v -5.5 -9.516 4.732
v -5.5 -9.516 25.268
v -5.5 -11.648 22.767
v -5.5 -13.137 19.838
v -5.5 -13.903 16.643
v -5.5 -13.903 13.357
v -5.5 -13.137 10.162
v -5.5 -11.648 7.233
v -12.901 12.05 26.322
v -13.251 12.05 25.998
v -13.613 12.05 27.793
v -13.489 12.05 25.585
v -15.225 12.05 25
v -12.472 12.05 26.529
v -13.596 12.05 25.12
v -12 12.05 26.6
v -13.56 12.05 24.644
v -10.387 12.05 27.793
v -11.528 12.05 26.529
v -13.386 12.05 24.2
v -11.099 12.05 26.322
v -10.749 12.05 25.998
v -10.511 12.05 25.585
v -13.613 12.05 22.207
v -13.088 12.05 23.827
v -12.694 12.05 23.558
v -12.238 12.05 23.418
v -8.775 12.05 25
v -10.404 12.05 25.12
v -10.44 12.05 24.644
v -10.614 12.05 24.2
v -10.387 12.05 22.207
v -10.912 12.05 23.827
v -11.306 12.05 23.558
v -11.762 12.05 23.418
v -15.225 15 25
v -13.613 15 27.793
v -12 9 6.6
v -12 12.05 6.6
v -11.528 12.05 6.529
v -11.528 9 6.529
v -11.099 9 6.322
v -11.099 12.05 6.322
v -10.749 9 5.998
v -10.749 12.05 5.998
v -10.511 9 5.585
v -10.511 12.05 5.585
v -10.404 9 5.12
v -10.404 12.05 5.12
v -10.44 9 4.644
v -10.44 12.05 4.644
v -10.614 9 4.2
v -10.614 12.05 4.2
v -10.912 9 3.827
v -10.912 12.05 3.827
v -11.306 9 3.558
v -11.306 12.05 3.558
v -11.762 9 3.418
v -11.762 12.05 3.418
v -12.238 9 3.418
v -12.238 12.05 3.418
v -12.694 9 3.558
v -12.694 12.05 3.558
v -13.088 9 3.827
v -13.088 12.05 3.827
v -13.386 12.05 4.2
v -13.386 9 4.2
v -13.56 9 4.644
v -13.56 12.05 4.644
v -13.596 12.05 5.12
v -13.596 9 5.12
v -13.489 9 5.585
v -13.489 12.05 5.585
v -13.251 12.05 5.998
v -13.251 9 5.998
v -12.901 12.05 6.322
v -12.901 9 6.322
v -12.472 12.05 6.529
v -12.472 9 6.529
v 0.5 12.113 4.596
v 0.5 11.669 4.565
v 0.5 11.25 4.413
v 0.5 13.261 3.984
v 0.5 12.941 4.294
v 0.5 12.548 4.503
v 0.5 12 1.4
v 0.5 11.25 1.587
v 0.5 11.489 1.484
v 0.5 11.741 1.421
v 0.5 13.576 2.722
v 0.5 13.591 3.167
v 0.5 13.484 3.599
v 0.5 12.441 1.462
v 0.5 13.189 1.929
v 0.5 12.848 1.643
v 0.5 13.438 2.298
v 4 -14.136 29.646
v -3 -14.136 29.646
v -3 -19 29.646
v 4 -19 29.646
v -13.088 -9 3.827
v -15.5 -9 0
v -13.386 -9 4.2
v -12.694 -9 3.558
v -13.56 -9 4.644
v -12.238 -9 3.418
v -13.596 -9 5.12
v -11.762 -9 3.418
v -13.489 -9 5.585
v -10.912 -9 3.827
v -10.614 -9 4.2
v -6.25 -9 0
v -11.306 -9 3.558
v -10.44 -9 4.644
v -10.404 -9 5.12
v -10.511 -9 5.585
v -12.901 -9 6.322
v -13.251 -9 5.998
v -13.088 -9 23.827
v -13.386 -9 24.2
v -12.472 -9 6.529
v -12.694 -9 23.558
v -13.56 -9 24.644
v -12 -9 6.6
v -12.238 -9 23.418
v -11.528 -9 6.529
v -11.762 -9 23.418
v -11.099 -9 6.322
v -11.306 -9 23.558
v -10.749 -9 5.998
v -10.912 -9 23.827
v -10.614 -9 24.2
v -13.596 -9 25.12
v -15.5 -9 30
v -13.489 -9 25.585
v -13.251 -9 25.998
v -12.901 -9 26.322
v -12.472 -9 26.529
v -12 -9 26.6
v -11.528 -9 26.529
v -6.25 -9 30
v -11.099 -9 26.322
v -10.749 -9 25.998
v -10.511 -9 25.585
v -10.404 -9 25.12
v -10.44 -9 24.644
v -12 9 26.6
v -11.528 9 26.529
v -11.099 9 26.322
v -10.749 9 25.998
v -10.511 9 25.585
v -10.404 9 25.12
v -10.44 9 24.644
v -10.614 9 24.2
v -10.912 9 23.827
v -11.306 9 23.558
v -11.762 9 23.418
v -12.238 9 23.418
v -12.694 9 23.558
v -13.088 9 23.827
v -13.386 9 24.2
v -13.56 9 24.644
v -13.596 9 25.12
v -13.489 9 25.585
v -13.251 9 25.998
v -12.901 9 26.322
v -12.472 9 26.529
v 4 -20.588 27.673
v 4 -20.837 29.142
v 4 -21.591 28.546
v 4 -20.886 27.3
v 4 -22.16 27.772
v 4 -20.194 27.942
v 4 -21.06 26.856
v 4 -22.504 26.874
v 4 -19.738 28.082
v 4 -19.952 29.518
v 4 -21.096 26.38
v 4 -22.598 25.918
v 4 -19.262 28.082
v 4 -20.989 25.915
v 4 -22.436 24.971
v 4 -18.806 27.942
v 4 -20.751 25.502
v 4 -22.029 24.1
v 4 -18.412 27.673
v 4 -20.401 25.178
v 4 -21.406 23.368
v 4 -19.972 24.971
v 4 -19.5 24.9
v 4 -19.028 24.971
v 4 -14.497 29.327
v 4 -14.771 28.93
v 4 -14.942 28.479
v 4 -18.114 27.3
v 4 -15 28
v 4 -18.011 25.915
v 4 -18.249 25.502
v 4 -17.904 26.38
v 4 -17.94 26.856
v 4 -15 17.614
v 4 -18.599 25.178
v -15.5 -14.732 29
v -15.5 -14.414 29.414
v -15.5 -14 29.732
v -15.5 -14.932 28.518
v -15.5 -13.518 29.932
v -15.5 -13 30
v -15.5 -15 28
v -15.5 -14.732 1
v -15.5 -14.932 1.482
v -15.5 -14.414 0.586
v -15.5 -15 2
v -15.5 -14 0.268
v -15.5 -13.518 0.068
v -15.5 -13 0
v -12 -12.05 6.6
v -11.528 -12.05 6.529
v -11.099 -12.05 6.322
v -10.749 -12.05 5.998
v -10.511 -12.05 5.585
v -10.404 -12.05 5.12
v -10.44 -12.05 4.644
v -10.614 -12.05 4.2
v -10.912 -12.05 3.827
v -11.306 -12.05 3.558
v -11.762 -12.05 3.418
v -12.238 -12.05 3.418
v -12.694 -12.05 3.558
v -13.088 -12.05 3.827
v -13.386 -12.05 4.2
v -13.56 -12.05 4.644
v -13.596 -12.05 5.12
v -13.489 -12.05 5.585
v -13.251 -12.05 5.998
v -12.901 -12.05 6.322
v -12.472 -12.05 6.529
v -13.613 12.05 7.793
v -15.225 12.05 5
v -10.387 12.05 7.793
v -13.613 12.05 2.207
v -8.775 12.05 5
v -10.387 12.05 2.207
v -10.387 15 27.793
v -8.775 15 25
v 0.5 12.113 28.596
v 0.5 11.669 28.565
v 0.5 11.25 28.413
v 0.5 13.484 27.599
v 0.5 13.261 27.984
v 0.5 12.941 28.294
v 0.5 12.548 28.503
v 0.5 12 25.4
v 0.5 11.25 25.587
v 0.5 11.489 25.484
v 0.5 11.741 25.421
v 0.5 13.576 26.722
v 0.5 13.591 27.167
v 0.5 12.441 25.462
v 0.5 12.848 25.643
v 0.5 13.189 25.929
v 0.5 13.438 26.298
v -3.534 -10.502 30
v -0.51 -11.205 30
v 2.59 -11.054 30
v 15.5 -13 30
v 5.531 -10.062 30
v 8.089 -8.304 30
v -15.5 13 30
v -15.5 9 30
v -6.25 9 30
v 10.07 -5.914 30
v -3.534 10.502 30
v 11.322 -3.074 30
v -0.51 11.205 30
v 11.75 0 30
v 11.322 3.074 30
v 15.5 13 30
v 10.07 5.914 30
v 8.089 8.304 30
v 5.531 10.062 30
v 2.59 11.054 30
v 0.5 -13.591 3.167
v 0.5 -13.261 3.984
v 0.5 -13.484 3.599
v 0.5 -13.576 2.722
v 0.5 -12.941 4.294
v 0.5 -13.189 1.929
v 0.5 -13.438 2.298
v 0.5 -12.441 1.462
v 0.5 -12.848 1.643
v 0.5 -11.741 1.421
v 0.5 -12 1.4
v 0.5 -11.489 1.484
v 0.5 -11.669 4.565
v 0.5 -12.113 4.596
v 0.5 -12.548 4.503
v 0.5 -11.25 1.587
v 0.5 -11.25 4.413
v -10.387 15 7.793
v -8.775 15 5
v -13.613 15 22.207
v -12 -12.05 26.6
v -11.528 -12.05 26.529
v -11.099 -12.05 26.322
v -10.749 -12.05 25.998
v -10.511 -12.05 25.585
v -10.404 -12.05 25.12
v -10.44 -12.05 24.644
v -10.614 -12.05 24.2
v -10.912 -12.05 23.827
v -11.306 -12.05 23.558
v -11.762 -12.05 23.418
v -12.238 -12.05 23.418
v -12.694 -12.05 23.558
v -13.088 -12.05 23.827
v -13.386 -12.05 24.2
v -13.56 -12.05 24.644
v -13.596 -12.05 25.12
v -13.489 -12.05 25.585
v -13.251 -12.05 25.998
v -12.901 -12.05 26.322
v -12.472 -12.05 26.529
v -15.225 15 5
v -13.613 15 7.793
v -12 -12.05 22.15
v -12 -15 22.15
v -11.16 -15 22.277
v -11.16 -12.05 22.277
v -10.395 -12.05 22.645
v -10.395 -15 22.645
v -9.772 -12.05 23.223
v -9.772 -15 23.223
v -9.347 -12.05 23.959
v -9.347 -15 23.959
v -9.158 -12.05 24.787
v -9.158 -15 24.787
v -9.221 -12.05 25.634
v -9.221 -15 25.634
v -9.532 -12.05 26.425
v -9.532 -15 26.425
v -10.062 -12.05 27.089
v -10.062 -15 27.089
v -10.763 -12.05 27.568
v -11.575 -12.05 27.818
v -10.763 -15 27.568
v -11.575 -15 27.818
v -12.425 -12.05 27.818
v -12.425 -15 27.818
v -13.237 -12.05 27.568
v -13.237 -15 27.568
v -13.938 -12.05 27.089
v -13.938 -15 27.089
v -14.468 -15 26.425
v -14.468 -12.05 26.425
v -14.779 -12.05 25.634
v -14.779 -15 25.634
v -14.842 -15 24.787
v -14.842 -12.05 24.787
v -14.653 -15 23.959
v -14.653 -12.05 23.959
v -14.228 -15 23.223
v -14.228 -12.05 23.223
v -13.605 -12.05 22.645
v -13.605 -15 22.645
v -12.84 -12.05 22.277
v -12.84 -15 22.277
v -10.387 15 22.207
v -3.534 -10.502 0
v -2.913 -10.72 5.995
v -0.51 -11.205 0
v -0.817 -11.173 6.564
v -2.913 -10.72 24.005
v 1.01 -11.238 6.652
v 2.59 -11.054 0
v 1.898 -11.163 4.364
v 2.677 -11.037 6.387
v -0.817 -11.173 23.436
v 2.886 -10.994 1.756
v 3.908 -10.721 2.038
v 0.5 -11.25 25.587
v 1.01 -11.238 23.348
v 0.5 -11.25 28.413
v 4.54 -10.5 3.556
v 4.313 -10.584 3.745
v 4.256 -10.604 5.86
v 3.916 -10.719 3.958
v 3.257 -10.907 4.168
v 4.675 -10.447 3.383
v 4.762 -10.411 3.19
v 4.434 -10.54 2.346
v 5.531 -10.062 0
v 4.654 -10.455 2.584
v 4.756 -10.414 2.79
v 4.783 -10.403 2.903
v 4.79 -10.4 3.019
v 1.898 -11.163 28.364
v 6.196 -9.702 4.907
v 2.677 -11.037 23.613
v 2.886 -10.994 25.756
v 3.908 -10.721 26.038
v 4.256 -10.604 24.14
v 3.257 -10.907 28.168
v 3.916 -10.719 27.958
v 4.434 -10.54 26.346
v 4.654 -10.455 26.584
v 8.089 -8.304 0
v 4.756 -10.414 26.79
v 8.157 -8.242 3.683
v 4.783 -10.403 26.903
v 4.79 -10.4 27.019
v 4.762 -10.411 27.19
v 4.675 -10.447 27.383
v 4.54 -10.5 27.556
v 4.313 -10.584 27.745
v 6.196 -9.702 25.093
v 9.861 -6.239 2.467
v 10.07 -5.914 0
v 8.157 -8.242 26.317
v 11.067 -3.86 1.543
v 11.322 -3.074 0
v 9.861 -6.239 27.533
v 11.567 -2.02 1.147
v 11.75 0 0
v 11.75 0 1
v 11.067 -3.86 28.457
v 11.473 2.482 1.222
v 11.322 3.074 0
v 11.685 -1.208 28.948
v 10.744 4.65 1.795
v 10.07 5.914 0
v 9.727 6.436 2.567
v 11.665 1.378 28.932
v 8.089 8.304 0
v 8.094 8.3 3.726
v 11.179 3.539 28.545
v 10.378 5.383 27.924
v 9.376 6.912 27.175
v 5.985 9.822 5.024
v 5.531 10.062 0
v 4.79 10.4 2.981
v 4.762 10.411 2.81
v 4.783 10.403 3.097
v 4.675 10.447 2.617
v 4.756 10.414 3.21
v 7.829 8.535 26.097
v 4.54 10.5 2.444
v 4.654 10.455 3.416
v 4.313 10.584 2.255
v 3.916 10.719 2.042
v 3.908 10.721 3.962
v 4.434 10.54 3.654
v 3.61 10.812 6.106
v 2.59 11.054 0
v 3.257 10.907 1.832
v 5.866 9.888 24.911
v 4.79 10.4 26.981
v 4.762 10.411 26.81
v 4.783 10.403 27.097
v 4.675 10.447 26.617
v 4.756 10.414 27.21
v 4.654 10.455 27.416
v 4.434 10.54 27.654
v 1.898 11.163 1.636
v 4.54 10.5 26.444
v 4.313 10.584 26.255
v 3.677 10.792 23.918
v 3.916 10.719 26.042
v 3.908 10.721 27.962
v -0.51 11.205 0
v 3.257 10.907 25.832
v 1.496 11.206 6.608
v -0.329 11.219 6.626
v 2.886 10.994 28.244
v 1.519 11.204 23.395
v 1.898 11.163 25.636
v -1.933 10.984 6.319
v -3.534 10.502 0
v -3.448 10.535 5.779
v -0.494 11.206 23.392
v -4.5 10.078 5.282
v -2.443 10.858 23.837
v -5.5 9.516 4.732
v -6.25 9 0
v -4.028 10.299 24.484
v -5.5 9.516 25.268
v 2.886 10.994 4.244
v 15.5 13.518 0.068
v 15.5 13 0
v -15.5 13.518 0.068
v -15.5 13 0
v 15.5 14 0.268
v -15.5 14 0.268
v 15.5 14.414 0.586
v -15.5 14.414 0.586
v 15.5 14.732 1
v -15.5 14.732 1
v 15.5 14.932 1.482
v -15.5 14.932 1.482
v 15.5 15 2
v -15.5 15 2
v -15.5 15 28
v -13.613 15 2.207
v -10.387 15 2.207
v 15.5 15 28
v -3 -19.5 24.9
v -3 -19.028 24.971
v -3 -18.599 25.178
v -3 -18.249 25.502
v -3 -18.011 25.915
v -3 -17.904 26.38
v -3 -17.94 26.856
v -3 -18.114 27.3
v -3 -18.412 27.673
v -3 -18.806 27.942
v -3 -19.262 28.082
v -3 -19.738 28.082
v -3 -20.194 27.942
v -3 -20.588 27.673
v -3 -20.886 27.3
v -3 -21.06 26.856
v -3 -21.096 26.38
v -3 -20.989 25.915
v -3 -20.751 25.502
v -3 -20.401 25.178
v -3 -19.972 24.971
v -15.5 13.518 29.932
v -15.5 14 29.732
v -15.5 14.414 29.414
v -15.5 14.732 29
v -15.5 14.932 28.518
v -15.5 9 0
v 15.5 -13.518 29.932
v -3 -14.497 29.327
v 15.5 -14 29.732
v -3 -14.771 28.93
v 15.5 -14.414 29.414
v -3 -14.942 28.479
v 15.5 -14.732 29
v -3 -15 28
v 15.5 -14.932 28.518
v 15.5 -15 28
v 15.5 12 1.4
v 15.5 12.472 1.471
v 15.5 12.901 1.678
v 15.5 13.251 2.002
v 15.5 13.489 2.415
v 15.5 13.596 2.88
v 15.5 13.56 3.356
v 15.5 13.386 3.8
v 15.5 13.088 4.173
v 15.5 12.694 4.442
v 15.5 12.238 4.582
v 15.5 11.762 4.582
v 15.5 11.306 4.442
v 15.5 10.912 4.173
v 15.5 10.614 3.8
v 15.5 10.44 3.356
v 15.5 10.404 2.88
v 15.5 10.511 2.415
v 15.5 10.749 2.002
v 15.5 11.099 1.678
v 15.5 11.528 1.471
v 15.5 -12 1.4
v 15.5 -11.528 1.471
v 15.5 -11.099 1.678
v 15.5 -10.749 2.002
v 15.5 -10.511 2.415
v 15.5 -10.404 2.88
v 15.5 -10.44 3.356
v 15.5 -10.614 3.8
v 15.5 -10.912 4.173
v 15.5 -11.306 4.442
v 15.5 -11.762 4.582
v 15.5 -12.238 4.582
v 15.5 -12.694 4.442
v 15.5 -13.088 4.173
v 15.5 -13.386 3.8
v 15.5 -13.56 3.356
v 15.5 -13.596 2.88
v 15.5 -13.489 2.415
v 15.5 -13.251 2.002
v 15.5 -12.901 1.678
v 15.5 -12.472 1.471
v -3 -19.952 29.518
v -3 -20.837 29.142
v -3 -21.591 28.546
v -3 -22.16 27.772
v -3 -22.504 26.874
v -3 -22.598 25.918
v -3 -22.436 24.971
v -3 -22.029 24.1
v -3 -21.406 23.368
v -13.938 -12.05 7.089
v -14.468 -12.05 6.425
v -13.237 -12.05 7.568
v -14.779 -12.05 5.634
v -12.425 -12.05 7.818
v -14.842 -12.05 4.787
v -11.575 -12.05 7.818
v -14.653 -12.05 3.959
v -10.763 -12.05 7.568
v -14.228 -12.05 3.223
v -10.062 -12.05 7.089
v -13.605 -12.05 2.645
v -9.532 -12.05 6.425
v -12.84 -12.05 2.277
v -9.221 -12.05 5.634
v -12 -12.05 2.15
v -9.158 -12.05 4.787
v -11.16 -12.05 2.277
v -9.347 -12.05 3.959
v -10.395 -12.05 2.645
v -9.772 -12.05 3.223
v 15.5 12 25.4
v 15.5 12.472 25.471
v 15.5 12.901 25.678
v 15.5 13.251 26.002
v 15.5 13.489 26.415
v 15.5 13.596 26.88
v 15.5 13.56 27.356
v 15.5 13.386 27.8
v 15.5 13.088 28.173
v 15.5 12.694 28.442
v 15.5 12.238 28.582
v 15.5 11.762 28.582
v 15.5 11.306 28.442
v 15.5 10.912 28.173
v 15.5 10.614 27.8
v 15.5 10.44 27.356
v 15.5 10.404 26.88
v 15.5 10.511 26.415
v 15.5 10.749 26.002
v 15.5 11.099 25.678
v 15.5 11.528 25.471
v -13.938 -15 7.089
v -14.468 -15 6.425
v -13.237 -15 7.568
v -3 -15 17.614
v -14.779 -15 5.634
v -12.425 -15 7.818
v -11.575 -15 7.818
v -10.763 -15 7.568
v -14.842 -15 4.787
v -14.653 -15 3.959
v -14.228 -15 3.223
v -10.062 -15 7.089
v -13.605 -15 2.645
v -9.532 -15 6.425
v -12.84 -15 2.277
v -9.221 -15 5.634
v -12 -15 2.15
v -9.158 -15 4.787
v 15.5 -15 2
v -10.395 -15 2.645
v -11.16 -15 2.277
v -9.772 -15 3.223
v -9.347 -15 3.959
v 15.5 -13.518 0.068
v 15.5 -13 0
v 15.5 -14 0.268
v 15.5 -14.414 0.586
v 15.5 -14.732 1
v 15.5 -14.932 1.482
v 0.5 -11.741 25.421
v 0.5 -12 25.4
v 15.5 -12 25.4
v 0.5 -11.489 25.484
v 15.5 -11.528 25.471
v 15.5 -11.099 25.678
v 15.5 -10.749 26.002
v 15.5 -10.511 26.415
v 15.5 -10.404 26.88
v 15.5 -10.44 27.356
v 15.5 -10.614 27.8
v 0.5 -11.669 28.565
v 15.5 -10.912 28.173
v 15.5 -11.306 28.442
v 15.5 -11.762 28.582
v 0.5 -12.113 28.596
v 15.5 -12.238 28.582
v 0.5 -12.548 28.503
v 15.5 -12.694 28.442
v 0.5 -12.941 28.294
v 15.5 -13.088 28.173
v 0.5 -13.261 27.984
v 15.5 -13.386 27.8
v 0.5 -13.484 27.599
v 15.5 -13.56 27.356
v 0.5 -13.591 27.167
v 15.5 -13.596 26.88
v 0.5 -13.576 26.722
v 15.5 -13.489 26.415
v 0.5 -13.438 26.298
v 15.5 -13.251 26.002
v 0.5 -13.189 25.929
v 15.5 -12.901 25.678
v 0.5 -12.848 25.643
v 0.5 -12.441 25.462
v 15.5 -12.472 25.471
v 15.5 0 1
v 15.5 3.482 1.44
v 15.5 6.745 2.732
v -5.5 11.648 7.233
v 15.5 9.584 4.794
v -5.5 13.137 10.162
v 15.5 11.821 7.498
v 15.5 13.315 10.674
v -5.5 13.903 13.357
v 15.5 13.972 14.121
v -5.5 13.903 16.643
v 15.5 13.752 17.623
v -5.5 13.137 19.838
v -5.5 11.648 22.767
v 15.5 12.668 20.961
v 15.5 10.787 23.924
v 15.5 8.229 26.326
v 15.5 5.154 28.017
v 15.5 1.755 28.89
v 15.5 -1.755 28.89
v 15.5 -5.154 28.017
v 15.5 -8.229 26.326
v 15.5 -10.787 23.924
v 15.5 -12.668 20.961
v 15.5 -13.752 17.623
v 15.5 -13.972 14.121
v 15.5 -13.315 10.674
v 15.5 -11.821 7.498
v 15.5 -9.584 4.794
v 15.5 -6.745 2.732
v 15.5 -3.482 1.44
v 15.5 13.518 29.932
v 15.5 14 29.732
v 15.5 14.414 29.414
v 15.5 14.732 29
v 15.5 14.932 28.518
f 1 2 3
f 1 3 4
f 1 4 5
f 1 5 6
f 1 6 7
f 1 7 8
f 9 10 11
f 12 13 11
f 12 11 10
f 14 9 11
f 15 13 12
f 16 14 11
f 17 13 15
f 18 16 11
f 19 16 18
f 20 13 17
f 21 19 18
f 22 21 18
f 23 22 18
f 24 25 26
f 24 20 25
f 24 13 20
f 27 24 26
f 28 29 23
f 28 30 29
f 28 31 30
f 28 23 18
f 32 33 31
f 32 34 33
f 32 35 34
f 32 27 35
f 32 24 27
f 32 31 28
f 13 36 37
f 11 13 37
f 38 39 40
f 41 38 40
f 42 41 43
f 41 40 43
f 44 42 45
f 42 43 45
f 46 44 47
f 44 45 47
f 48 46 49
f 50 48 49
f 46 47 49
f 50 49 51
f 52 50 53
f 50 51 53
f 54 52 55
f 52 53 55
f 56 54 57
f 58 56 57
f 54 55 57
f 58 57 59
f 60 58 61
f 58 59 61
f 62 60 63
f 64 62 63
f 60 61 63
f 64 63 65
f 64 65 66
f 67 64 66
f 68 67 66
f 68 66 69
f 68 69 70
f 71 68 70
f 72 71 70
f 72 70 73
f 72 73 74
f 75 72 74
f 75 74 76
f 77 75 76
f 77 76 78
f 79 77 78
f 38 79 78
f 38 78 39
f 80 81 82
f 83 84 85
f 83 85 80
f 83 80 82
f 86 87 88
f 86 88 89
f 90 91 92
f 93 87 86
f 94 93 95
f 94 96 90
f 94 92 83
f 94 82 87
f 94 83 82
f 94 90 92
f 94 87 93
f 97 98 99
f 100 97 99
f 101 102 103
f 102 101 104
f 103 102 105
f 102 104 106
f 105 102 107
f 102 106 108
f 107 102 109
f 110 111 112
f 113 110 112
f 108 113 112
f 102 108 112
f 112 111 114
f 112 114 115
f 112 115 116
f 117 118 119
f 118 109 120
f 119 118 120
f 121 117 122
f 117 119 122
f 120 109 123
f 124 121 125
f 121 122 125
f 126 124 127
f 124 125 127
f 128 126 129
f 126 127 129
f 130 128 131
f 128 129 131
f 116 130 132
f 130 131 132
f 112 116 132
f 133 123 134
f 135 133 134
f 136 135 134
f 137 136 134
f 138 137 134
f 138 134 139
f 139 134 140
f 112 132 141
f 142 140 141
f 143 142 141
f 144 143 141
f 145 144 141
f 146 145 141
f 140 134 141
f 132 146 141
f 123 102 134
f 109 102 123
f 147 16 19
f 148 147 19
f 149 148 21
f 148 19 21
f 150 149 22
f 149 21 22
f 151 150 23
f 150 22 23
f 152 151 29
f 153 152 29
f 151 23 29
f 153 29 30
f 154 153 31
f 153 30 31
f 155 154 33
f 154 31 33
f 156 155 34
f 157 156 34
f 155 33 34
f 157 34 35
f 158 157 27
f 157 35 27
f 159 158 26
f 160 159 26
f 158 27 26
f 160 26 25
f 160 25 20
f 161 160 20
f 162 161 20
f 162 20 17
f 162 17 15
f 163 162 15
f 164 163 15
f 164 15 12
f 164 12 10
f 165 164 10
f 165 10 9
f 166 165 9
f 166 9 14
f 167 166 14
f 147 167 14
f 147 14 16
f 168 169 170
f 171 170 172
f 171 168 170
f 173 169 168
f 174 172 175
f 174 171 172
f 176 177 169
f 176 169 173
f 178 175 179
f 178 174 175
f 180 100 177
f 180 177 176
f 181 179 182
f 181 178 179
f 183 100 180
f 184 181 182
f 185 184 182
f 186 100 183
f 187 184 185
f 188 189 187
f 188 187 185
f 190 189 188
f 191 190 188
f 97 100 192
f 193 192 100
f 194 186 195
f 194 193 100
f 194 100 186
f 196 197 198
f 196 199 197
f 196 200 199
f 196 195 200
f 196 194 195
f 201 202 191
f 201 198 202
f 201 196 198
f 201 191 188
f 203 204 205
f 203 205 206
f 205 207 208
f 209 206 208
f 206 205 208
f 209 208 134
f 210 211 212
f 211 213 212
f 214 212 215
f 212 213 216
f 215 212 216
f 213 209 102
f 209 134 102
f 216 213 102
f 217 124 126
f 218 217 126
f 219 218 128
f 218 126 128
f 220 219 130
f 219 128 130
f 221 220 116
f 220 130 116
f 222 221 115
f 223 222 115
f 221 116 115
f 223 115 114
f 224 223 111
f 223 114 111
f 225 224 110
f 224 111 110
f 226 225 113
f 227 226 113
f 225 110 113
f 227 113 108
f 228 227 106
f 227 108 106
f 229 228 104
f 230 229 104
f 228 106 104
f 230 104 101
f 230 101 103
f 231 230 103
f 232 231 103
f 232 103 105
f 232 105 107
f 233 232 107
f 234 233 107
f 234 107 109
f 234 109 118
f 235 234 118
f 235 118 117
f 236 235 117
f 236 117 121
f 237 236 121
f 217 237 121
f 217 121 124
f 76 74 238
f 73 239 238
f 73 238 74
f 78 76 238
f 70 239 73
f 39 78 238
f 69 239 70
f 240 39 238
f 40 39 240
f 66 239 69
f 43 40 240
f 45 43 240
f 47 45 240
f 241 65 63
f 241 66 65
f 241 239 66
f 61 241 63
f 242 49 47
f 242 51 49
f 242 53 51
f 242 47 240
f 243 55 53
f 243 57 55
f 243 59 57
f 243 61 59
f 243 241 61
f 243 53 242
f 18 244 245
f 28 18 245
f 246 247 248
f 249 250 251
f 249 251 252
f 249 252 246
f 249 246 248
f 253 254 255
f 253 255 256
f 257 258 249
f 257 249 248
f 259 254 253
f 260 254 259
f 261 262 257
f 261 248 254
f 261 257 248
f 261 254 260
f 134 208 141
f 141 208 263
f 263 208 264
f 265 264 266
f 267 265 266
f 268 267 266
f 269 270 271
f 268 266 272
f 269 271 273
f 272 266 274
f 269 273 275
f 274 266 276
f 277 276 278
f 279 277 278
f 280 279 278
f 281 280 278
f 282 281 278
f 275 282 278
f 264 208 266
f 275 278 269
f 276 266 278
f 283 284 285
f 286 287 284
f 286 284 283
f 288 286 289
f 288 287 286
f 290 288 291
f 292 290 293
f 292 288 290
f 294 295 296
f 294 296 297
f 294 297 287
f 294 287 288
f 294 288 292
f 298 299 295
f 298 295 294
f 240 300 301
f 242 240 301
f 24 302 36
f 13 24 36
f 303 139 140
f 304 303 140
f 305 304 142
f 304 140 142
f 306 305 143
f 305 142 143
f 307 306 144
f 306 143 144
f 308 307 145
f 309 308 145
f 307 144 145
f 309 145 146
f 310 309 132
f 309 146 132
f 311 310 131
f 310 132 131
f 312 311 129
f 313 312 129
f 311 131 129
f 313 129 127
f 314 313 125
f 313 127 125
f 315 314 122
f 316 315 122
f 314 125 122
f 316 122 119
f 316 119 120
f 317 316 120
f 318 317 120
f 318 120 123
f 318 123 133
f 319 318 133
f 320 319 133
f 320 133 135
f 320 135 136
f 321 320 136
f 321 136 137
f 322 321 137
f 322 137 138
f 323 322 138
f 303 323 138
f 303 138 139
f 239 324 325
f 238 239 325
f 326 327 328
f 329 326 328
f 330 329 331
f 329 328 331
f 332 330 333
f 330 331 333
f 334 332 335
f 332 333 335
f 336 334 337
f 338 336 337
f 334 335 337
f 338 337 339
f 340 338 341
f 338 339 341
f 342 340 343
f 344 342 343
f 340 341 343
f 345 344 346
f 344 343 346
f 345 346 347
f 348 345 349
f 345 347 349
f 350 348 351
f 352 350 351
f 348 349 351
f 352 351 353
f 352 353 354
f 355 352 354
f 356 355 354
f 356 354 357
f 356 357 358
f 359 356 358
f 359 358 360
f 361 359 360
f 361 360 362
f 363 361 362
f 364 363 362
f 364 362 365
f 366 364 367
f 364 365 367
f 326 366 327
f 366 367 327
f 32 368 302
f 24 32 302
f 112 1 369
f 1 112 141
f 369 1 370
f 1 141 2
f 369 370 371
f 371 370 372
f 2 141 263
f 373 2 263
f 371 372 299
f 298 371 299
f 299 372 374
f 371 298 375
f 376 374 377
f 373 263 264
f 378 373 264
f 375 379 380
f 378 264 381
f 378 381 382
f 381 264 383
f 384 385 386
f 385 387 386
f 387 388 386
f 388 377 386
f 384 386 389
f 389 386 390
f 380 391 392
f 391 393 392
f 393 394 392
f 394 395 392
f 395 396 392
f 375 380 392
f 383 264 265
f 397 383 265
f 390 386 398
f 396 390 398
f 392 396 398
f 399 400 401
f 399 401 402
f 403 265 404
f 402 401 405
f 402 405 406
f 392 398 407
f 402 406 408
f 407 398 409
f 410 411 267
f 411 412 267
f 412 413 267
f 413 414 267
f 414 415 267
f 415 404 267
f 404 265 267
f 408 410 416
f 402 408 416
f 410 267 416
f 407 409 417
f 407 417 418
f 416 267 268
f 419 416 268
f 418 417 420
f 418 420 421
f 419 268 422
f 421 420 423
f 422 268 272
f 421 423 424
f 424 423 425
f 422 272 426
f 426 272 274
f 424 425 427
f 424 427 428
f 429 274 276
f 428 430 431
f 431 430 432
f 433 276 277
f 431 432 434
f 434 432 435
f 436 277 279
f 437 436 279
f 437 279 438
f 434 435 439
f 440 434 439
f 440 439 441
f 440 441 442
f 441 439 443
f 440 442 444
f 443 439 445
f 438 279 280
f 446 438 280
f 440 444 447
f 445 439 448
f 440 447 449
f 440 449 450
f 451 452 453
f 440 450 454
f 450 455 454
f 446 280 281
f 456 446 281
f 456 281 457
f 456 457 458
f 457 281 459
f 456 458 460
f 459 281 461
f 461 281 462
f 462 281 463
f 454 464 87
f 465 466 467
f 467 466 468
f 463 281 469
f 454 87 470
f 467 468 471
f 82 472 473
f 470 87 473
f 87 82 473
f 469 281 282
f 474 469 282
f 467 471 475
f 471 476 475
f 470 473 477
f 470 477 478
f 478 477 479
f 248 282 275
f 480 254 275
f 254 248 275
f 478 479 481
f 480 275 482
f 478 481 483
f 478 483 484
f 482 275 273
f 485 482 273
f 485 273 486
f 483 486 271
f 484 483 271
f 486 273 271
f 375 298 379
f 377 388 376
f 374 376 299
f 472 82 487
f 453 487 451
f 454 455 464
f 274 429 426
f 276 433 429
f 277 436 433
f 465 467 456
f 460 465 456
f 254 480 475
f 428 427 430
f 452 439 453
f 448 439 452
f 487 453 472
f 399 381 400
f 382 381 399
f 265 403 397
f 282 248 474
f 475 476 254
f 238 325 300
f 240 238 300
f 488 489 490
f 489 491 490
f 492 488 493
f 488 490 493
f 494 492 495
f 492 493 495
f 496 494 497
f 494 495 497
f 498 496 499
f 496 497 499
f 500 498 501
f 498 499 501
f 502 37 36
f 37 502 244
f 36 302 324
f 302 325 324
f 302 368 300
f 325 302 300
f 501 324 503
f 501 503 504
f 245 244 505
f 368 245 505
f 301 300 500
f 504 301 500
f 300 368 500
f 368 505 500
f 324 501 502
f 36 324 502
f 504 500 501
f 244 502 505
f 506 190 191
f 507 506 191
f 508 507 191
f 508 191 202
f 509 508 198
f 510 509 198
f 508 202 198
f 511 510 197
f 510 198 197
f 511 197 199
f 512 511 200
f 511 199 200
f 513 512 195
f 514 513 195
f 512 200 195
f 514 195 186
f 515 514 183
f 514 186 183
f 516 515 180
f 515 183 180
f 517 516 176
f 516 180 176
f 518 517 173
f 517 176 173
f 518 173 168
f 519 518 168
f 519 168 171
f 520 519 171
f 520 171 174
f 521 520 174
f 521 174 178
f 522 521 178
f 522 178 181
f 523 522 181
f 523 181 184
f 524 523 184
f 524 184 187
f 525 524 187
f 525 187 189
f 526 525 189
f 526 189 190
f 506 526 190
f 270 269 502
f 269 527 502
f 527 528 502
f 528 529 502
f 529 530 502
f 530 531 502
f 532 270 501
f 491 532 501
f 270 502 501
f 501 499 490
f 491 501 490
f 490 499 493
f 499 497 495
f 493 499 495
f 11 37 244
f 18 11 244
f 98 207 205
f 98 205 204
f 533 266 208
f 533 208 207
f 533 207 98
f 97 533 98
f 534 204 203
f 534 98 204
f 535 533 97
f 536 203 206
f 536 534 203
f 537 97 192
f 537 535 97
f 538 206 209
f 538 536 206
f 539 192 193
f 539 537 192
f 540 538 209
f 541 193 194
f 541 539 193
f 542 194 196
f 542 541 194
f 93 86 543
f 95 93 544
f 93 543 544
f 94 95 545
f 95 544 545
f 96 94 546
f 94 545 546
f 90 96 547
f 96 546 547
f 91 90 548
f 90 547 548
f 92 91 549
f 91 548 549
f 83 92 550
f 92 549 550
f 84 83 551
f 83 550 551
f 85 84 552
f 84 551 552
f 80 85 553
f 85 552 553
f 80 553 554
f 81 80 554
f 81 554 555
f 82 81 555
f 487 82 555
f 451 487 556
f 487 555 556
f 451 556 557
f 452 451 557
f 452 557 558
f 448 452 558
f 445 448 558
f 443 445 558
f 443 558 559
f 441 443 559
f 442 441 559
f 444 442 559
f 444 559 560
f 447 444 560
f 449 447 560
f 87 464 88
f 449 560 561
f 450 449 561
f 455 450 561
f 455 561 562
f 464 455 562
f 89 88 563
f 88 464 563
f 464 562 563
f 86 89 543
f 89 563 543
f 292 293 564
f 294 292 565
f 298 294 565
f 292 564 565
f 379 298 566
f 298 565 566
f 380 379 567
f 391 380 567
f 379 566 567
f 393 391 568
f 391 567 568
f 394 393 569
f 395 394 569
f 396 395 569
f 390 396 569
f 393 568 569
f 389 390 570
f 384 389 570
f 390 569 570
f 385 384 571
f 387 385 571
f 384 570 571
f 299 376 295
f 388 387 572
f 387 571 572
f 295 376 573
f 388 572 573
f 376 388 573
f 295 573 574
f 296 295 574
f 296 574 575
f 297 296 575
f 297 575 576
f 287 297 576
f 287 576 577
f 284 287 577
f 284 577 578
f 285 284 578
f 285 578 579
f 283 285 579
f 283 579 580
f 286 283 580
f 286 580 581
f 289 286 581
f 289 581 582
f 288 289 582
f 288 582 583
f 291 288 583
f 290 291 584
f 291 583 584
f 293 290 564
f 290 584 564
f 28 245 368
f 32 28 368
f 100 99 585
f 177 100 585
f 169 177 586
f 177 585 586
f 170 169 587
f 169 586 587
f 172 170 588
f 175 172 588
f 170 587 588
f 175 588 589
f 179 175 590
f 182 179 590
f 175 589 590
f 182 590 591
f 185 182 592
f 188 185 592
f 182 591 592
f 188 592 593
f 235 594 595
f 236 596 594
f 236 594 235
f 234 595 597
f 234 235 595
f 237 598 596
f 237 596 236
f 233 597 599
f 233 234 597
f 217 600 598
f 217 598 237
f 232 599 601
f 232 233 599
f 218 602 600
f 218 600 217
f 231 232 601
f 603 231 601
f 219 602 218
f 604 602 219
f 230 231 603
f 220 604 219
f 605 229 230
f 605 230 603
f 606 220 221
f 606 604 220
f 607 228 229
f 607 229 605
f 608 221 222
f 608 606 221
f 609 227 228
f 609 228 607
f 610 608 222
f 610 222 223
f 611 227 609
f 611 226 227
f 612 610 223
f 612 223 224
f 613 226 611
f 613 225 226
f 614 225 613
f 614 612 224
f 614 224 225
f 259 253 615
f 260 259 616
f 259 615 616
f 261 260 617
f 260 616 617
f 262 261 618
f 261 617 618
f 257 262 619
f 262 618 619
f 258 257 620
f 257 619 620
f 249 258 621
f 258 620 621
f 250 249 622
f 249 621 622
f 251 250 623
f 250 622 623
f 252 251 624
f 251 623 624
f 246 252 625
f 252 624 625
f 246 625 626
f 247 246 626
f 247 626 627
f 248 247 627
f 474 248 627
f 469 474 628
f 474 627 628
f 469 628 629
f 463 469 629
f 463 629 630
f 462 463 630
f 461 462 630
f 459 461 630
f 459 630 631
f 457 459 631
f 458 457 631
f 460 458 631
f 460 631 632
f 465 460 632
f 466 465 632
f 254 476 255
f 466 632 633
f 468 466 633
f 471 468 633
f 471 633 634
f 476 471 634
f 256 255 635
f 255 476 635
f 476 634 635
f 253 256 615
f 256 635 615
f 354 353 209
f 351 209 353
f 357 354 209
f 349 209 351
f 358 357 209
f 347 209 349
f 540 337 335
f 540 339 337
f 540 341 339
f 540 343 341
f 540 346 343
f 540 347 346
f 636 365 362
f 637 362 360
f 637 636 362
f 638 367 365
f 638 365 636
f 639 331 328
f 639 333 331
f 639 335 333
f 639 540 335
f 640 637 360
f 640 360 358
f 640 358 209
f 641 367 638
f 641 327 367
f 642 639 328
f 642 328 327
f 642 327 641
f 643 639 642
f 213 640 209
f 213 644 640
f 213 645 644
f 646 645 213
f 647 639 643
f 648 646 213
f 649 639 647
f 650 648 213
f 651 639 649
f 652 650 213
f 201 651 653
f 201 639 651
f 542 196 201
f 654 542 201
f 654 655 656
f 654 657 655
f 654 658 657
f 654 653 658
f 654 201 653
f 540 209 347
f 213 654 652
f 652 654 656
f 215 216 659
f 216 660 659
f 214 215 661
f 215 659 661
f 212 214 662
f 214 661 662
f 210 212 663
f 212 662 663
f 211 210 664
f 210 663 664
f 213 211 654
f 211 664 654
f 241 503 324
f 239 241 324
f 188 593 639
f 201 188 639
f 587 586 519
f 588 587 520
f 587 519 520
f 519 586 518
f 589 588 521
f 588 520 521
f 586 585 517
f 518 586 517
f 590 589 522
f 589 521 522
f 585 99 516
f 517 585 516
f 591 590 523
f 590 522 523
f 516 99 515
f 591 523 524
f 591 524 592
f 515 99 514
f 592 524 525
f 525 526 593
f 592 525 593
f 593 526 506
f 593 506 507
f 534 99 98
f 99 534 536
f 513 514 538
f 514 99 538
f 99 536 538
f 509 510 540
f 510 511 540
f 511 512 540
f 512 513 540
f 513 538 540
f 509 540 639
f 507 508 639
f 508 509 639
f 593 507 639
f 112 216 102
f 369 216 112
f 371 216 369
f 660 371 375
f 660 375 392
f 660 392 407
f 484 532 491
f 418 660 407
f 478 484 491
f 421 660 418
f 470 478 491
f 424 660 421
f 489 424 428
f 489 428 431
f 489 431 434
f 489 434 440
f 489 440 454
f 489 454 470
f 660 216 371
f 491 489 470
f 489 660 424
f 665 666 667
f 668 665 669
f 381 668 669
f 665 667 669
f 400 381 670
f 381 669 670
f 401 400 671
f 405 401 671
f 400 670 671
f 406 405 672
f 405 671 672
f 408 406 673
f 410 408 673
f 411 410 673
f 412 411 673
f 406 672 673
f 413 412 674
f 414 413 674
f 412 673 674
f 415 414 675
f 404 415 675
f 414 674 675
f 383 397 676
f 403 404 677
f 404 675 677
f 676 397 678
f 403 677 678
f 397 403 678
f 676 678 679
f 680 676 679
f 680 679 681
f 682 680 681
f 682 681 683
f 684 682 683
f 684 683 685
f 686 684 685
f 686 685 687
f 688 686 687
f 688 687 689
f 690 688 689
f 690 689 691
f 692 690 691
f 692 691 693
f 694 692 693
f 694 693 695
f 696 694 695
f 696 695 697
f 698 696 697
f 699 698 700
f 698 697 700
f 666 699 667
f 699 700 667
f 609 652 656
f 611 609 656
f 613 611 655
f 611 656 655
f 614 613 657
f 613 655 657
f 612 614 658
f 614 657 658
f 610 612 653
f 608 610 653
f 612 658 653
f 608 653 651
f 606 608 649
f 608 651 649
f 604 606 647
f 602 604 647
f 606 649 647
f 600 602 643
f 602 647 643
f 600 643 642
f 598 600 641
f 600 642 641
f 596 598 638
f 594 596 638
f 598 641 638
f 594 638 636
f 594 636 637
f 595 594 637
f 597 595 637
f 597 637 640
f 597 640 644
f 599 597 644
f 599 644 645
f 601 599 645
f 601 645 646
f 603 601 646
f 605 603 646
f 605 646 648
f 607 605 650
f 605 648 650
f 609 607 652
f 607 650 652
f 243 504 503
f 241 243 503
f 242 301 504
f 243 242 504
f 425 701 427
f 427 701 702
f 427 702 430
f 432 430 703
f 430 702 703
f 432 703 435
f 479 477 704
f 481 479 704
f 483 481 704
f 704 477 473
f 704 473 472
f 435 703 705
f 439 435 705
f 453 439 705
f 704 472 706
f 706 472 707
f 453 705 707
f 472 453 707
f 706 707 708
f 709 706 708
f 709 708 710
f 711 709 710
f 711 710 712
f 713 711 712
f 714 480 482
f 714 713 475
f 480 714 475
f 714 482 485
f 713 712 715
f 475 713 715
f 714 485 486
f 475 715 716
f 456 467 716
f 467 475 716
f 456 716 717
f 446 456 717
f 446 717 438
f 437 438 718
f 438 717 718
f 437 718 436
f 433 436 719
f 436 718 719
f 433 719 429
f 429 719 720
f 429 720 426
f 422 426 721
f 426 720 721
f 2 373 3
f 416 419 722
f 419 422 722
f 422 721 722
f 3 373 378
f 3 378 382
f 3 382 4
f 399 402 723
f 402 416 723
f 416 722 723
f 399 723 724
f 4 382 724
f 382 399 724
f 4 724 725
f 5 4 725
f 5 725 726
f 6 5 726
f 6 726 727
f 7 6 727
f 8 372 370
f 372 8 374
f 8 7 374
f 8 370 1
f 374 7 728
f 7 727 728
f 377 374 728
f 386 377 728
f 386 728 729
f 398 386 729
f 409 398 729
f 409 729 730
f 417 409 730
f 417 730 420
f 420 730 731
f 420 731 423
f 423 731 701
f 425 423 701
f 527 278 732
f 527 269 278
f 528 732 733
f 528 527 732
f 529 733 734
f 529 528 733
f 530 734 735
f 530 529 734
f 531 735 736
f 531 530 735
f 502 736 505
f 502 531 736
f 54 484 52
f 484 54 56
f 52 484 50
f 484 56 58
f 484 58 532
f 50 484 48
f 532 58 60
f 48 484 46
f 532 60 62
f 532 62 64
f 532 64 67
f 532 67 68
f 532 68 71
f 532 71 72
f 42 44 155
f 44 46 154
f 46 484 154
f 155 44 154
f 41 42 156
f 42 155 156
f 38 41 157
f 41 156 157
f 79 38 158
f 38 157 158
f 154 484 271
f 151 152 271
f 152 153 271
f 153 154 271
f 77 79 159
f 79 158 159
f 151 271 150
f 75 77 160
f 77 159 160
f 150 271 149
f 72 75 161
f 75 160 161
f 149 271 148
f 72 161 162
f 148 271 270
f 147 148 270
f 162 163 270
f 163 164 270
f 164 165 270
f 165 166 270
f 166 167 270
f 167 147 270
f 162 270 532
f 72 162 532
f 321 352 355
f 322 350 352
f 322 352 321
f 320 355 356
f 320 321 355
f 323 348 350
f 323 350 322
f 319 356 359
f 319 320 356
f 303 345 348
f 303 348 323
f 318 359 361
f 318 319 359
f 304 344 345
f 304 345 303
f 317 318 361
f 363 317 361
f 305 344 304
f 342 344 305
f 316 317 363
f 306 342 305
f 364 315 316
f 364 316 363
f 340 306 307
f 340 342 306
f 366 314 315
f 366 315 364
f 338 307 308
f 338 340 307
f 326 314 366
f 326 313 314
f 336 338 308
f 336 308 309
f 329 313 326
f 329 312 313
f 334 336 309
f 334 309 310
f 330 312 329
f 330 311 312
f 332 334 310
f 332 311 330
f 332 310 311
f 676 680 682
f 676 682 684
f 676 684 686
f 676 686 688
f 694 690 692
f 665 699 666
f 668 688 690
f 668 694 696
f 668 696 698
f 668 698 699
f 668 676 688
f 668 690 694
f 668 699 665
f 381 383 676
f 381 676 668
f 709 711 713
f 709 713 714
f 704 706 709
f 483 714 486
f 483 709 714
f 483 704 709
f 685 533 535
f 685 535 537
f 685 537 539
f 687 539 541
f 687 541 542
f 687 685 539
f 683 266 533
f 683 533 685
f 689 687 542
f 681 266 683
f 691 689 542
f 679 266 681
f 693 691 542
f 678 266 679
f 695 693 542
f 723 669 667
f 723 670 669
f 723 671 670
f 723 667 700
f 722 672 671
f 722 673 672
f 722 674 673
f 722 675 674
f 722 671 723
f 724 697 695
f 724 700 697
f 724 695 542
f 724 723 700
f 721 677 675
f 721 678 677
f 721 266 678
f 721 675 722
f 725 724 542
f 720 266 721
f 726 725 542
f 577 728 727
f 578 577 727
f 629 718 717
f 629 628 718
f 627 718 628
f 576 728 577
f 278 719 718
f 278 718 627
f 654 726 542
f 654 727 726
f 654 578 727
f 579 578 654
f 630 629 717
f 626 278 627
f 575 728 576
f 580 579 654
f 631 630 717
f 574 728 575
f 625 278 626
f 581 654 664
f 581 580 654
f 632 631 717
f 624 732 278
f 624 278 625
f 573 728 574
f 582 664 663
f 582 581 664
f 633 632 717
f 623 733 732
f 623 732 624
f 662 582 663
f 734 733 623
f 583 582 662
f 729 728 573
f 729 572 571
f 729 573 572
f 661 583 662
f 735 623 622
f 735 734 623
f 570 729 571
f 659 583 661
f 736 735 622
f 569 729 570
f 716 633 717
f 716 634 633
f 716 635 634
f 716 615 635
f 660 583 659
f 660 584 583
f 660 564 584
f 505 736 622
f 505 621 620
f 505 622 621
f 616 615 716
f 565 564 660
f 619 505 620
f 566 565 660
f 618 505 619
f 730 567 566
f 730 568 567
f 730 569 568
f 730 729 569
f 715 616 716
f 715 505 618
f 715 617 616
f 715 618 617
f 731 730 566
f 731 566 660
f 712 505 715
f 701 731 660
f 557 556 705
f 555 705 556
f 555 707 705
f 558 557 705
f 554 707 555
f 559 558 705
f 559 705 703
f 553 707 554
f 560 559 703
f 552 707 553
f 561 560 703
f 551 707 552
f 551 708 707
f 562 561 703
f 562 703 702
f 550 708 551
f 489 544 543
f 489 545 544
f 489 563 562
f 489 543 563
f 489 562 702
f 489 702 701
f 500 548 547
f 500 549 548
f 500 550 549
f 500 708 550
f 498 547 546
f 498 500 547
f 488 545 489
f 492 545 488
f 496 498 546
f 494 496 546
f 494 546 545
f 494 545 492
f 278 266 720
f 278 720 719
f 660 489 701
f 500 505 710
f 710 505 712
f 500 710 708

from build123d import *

# Parameters (mm, degrees)
SKETCH1_W           = 30
SKETCH1_H           = 30
BOSS_EXTRUDE1_DEPTH = 15.5
FILLET1_R           = 2
SKETCH2_R           = 14
CUT_EXTRUDE1_DEPTH  = 21
SKETCH3_R           = 1.6
CUT_EXTRUDE2_DEPTH  = 15
CUT_EXTRUDE3_DEPTH  = 37.949289574
SKETCH5_R           = 1.6
CUT_EXTRUDE4_DEPTH  = 46.169126725
CUT_EXTRUDE5_DEPTH  = 2.95
SKETCH7_R           = 2.85
CUT_EXTRUDE6_DEPTH  = 2.95
BOSS_EXTRUDE2_START = -18.5
BOSS_EXTRUDE2_DEPTH = 7
SKETCH9_R           = 1.6
CUT_EXTRUDE7_DEPTH  = 43.320326157


with BuildPart() as part:
    # Sketch1 → Boss-Extrude1 (new, symmetric)
    with BuildSketch(Plane(origin=(0, 0, 0), x_dir=(0, 0, -1), z_dir=(1, 0, 0))):
        with Locations((-15, 0)):
            Rectangle(SKETCH1_W, SKETCH1_H)
    extrude(amount=BOSS_EXTRUDE1_DEPTH, both=True)

    # Fillet1
    fillet1_edges = [part.edges().sort_by_distance(p)[0] for p in [
        (0, -15, 0),
        (0, -15, 30),
        (0, 15, 30),
        (0, 15, 0),
    ]]
    fillet(fillet1_edges, radius=FILLET1_R)

    # Sketch2 → Cut-Extrude1 (cut)
    with BuildSketch(Plane(origin=(15.5, 0, 0), x_dir=(0, 0, -1), z_dir=(1, 0, 0))):
        with Locations((-15, 0)):
            Circle(SKETCH2_R)
    extrude(amount=-CUT_EXTRUDE1_DEPTH, mode=Mode.SUBTRACT)

    # Sketch3 → Cut-Extrude2 (cut)
    with BuildSketch(Plane(origin=(15.5, 0, 0), x_dir=(0, 0, -1), z_dir=(1, 0, 0))):
        with Locations((-27, 12)):
            Circle(SKETCH3_R)
        with Locations((-3, 12)):
            Circle(SKETCH3_R)
        with Locations((-3, -12)):
            Circle(SKETCH3_R)
        with Locations((-27, -12)):
            Circle(SKETCH3_R)
    extrude(amount=-CUT_EXTRUDE2_DEPTH, mode=Mode.SUBTRACT)

    # Sketch4 → Cut-Extrude3 (cut, through all)
    with BuildSketch(Plane.XY.offset(30)):
        with BuildLine():
            Line((-6.25, 9), (-15.5, 9))
            Line((-15.5, 9), (-15.5, -9))
            Line((-15.5, -9), (-6.25, -9))
            ThreePointArc((-6.25, -9), (11.75, 0), (-6.25, 9))
        make_face()
    extrude(amount=-CUT_EXTRUDE3_DEPTH, mode=Mode.SUBTRACT)

    # Sketch5 → Cut-Extrude4 (cut, through all)
    with BuildSketch(Plane(origin=(0, 15, 0), x_dir=(1, 0, 0), z_dir=(0, 1, 0))):
        with Locations(Location((-12, -5, 0), (0, 0, 270))):
            Circle(SKETCH5_R)
        with Locations(Location((-12, -25, 0), (0, 0, 270))):
            Circle(SKETCH5_R)
    extrude(amount=-CUT_EXTRUDE4_DEPTH, mode=Mode.SUBTRACT)

    # Sketch6 → Cut-Extrude5 (cut)
    with BuildSketch(Plane(origin=(0, 15, 0), x_dir=(1, 0, 0), z_dir=(0, 1, 0))):
        Polygon((-10.387287493, -7.7933), (-8.774574986, -5), (-10.387287493, -2.2067), (-13.612712507, -2.2067), (-15.225425014, -5), (-13.612712507, -7.7933), align=None)
        Polygon((-8.774574986, -25), (-10.387287493, -22.2067), (-13.612712507, -22.2067), (-15.225425014, -25), (-13.612712507, -27.7933), (-10.387287493, -27.7933), align=None)
    extrude(amount=-CUT_EXTRUDE5_DEPTH, mode=Mode.SUBTRACT)

    # Sketch7 → Cut-Extrude6 (cut)
    with BuildSketch(Plane.XZ.offset(15)):
        with Locations(Location((-12, 25, 0), (0, 0, 270))):
            Circle(SKETCH7_R)
        with Locations(Location((-12, 5, 0), (0, 0, 270))):
            Circle(SKETCH7_R)
    extrude(amount=-CUT_EXTRUDE6_DEPTH, mode=Mode.SUBTRACT)

    # Sketch8 → Boss-Extrude2 (add)
    with BuildSketch(Plane(origin=(15.5, 0, 0), x_dir=(0, 0, -1), z_dir=(1, 0, 0)).offset(BOSS_EXTRUDE2_START)):
        with BuildLine():
            Line((-29.6463, -14.135647969), (-29.6463, -19))
            ThreePointArc((-29.6463, -19), (-27.334438807, -22.361651144), (-23.368134214, -21.405707385))
            Line((-23.368134214, -21.405707385), (-17.6141, -15))
            Line((-17.6141, -15), (-28, -15))
            ThreePointArc((-28, -15), (-28.929705346, -14.770776092), (-29.6463, -14.135647969))
        make_face()
    extrude(amount=BOSS_EXTRUDE2_DEPTH)

    # Sketch9 → Cut-Extrude7 (cut, through all)
    with BuildSketch(Plane(origin=(4, 0, 0), x_dir=(0, 0, -1), z_dir=(1, 0, 0))):
        with Locations((-26.5, -19.5)):
            Circle(SKETCH9_R)
    extrude(amount=-CUT_EXTRUDE7_DEPTH, mode=Mode.SUBTRACT)


solid = part.part
